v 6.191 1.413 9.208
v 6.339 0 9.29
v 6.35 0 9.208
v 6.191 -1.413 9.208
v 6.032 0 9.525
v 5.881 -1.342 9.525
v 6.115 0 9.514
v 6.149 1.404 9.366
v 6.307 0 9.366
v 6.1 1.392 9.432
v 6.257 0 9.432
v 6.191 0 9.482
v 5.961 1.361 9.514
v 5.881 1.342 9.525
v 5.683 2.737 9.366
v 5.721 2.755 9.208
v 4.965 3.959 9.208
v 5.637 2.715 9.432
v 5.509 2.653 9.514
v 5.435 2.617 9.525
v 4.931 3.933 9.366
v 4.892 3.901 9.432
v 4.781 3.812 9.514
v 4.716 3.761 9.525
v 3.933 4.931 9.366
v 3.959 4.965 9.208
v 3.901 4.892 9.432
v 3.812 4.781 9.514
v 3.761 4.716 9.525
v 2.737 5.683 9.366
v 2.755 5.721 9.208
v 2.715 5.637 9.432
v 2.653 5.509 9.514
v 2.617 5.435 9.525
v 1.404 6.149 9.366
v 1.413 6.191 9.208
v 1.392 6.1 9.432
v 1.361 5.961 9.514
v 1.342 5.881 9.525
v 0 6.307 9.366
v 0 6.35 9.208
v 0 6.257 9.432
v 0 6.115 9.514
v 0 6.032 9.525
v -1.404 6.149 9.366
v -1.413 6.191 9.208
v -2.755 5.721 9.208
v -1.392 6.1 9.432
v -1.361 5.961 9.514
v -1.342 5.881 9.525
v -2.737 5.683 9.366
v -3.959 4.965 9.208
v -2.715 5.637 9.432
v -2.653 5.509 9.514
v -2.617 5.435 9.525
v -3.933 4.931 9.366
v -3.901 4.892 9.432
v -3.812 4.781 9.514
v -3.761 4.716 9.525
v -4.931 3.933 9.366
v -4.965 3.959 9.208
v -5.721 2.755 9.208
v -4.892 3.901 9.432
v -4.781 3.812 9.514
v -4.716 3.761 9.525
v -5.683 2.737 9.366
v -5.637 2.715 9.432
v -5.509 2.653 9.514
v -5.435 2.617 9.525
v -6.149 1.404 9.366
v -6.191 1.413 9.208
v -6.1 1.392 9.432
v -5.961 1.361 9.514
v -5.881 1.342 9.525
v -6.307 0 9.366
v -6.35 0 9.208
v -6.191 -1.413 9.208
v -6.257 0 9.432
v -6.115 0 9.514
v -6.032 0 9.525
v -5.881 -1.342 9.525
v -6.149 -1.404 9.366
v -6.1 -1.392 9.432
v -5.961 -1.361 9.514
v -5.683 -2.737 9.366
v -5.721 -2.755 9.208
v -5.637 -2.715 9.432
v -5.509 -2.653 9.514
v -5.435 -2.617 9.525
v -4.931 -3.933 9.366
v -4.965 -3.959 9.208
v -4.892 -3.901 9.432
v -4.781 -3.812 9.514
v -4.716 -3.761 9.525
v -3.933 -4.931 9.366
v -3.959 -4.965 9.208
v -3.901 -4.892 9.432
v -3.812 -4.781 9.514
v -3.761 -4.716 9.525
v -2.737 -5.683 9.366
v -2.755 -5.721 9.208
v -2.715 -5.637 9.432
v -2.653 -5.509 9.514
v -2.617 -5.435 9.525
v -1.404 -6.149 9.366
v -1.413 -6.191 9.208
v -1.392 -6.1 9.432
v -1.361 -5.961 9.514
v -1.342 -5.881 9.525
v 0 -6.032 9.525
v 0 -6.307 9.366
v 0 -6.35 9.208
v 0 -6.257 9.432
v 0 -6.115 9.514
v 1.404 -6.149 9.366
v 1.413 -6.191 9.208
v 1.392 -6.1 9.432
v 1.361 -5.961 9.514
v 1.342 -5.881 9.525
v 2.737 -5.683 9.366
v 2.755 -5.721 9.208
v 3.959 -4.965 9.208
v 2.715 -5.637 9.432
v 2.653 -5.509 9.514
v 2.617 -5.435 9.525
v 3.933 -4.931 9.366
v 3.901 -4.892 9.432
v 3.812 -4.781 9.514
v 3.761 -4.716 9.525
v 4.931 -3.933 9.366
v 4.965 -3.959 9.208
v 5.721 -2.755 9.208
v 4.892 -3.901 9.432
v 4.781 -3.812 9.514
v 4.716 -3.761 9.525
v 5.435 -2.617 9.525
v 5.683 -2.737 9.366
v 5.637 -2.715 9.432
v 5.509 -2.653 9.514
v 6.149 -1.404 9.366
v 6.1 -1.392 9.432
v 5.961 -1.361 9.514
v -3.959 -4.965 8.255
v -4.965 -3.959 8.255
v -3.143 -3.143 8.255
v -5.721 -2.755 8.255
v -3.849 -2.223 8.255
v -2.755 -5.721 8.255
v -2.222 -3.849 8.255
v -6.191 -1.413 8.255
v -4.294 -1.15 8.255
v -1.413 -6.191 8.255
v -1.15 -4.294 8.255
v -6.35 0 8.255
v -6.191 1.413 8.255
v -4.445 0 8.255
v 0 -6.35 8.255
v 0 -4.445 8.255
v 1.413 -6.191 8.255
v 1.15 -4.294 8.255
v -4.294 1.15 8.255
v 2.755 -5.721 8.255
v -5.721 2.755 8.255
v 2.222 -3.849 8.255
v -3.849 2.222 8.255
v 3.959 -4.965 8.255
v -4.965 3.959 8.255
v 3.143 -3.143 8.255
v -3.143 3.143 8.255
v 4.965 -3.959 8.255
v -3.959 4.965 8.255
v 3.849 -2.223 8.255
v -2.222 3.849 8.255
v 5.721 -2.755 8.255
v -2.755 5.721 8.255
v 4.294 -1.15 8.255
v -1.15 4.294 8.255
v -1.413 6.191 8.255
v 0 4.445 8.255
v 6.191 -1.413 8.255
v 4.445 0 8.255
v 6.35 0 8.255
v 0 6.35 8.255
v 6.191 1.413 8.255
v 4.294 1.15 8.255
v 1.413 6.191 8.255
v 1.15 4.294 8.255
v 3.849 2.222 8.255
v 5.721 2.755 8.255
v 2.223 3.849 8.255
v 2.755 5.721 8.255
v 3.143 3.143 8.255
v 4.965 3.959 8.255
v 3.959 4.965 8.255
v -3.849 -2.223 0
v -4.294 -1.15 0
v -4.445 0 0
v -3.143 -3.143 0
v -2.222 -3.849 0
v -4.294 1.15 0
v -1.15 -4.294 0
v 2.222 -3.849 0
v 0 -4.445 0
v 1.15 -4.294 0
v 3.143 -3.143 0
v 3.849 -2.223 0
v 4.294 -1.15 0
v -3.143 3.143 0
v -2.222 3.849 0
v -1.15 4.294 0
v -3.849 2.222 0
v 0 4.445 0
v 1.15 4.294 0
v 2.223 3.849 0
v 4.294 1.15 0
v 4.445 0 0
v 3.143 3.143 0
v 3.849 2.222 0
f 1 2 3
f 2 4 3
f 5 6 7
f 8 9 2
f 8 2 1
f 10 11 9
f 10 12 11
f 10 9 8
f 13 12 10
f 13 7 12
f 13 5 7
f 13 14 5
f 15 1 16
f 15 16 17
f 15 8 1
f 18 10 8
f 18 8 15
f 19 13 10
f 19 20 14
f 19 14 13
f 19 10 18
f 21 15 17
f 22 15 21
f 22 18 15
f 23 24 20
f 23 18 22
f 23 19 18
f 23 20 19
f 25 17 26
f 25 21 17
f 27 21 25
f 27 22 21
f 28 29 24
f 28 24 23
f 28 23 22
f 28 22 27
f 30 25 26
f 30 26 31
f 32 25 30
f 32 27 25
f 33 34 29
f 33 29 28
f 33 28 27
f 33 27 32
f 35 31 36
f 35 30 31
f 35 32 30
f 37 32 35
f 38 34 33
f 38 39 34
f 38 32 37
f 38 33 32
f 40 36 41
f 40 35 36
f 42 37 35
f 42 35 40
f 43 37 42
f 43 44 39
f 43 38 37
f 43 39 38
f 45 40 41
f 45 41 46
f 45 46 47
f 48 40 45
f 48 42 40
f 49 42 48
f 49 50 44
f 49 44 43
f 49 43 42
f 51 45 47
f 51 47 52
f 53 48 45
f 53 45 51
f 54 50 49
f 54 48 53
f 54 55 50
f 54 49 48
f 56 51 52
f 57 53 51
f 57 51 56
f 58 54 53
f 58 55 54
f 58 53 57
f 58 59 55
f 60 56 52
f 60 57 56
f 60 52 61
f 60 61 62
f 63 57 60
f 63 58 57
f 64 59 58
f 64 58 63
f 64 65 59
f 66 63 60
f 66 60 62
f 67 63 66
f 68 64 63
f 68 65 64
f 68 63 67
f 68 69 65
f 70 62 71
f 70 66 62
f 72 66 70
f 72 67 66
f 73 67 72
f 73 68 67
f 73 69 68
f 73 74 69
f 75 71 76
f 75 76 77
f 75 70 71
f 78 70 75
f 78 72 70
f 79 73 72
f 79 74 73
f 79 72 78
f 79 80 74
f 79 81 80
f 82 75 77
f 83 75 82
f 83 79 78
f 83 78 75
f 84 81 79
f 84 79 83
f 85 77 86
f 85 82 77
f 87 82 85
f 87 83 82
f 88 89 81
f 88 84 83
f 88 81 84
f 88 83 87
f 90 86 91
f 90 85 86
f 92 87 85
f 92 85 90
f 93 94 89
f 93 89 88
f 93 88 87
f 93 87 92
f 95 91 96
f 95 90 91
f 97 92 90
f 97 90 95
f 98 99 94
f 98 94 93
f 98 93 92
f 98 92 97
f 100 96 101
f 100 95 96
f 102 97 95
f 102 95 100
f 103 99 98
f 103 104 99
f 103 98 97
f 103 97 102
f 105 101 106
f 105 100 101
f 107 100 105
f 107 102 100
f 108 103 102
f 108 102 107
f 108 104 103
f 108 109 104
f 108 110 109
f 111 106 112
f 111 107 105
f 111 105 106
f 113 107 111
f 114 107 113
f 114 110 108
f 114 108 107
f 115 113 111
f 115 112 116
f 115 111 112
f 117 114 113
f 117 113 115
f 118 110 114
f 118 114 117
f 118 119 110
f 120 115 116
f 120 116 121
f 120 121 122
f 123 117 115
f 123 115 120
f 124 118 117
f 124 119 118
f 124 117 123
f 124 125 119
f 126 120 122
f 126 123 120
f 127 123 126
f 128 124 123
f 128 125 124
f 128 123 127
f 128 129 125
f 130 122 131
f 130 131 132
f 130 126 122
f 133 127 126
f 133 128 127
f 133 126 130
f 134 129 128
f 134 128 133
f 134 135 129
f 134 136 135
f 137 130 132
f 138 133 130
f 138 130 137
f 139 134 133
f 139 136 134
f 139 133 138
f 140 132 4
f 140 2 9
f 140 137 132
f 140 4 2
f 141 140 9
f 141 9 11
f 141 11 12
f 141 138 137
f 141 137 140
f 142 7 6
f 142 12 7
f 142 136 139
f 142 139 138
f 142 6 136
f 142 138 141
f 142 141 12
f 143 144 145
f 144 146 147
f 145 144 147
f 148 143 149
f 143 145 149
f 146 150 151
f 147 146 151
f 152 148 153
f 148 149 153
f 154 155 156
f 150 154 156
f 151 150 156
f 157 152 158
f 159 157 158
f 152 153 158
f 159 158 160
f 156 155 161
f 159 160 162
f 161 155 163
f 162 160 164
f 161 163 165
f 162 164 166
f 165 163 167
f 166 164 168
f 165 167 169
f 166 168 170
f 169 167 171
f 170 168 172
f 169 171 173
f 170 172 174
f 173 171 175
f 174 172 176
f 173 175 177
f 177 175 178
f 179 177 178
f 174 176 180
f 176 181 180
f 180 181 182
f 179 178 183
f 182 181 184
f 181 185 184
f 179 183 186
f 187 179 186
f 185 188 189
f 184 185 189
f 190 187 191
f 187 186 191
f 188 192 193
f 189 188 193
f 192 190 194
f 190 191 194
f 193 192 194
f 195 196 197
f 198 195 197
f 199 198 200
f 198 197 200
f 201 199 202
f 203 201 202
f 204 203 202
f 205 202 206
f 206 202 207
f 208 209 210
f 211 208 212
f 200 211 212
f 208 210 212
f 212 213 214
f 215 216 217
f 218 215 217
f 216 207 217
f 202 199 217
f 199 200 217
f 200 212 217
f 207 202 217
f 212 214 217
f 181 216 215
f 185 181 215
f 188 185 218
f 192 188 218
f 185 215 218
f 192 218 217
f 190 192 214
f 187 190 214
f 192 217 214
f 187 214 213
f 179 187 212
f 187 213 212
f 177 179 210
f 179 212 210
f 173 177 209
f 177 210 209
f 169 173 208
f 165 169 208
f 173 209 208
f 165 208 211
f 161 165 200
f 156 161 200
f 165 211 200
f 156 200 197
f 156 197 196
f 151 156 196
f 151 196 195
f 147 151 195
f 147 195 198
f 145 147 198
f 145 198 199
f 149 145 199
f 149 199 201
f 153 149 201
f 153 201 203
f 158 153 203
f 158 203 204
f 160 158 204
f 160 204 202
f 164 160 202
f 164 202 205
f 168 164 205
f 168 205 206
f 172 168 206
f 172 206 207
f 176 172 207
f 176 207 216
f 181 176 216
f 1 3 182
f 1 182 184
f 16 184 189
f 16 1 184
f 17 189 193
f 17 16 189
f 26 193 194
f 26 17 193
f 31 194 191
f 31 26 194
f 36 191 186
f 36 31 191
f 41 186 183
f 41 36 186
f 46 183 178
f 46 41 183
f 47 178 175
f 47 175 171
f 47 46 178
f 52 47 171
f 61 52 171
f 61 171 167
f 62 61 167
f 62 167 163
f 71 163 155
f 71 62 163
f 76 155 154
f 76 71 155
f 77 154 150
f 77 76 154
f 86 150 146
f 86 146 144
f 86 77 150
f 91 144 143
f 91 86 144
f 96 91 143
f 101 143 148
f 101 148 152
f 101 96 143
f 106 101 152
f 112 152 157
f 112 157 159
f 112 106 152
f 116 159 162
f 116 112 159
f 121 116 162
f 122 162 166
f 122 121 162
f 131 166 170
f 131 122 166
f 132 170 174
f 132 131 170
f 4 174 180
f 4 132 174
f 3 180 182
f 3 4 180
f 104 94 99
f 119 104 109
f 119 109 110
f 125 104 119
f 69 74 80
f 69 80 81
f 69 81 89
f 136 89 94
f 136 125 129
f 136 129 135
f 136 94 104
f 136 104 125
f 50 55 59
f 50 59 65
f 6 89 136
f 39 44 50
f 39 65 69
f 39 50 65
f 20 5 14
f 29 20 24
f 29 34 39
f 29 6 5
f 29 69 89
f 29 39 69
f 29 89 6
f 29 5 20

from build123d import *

# Parameters (mm, degrees)
F0_R     = 4.445
F1_DEPTH = 9.525
F2_R     = 6.35
F2_R_2   = 4.445
F3_DEPTH = 1.27
F4_R     = 0.3175


with BuildPart() as f1:
    # F0 (on Top) → F1 (new body)
    with BuildSketch(Plane.XY):
        Circle(F0_R)
    extrude(amount=F1_DEPTH)

    # F2 (on face) → F3 (join)
    with BuildSketch(Plane.XY.offset(9.525)):
        Circle(F2_R)
        Circle(F2_R_2, mode=Mode.SUBTRACT)
    extrude(amount=-F3_DEPTH)

    # F4
    f4_edges = [f1.edges().sort_by_distance(p)[0] for p in [
        (-6.35, 0, 9.525),
    ]]
    fillet(f4_edges, radius=F4_R)


solid = f1.part
